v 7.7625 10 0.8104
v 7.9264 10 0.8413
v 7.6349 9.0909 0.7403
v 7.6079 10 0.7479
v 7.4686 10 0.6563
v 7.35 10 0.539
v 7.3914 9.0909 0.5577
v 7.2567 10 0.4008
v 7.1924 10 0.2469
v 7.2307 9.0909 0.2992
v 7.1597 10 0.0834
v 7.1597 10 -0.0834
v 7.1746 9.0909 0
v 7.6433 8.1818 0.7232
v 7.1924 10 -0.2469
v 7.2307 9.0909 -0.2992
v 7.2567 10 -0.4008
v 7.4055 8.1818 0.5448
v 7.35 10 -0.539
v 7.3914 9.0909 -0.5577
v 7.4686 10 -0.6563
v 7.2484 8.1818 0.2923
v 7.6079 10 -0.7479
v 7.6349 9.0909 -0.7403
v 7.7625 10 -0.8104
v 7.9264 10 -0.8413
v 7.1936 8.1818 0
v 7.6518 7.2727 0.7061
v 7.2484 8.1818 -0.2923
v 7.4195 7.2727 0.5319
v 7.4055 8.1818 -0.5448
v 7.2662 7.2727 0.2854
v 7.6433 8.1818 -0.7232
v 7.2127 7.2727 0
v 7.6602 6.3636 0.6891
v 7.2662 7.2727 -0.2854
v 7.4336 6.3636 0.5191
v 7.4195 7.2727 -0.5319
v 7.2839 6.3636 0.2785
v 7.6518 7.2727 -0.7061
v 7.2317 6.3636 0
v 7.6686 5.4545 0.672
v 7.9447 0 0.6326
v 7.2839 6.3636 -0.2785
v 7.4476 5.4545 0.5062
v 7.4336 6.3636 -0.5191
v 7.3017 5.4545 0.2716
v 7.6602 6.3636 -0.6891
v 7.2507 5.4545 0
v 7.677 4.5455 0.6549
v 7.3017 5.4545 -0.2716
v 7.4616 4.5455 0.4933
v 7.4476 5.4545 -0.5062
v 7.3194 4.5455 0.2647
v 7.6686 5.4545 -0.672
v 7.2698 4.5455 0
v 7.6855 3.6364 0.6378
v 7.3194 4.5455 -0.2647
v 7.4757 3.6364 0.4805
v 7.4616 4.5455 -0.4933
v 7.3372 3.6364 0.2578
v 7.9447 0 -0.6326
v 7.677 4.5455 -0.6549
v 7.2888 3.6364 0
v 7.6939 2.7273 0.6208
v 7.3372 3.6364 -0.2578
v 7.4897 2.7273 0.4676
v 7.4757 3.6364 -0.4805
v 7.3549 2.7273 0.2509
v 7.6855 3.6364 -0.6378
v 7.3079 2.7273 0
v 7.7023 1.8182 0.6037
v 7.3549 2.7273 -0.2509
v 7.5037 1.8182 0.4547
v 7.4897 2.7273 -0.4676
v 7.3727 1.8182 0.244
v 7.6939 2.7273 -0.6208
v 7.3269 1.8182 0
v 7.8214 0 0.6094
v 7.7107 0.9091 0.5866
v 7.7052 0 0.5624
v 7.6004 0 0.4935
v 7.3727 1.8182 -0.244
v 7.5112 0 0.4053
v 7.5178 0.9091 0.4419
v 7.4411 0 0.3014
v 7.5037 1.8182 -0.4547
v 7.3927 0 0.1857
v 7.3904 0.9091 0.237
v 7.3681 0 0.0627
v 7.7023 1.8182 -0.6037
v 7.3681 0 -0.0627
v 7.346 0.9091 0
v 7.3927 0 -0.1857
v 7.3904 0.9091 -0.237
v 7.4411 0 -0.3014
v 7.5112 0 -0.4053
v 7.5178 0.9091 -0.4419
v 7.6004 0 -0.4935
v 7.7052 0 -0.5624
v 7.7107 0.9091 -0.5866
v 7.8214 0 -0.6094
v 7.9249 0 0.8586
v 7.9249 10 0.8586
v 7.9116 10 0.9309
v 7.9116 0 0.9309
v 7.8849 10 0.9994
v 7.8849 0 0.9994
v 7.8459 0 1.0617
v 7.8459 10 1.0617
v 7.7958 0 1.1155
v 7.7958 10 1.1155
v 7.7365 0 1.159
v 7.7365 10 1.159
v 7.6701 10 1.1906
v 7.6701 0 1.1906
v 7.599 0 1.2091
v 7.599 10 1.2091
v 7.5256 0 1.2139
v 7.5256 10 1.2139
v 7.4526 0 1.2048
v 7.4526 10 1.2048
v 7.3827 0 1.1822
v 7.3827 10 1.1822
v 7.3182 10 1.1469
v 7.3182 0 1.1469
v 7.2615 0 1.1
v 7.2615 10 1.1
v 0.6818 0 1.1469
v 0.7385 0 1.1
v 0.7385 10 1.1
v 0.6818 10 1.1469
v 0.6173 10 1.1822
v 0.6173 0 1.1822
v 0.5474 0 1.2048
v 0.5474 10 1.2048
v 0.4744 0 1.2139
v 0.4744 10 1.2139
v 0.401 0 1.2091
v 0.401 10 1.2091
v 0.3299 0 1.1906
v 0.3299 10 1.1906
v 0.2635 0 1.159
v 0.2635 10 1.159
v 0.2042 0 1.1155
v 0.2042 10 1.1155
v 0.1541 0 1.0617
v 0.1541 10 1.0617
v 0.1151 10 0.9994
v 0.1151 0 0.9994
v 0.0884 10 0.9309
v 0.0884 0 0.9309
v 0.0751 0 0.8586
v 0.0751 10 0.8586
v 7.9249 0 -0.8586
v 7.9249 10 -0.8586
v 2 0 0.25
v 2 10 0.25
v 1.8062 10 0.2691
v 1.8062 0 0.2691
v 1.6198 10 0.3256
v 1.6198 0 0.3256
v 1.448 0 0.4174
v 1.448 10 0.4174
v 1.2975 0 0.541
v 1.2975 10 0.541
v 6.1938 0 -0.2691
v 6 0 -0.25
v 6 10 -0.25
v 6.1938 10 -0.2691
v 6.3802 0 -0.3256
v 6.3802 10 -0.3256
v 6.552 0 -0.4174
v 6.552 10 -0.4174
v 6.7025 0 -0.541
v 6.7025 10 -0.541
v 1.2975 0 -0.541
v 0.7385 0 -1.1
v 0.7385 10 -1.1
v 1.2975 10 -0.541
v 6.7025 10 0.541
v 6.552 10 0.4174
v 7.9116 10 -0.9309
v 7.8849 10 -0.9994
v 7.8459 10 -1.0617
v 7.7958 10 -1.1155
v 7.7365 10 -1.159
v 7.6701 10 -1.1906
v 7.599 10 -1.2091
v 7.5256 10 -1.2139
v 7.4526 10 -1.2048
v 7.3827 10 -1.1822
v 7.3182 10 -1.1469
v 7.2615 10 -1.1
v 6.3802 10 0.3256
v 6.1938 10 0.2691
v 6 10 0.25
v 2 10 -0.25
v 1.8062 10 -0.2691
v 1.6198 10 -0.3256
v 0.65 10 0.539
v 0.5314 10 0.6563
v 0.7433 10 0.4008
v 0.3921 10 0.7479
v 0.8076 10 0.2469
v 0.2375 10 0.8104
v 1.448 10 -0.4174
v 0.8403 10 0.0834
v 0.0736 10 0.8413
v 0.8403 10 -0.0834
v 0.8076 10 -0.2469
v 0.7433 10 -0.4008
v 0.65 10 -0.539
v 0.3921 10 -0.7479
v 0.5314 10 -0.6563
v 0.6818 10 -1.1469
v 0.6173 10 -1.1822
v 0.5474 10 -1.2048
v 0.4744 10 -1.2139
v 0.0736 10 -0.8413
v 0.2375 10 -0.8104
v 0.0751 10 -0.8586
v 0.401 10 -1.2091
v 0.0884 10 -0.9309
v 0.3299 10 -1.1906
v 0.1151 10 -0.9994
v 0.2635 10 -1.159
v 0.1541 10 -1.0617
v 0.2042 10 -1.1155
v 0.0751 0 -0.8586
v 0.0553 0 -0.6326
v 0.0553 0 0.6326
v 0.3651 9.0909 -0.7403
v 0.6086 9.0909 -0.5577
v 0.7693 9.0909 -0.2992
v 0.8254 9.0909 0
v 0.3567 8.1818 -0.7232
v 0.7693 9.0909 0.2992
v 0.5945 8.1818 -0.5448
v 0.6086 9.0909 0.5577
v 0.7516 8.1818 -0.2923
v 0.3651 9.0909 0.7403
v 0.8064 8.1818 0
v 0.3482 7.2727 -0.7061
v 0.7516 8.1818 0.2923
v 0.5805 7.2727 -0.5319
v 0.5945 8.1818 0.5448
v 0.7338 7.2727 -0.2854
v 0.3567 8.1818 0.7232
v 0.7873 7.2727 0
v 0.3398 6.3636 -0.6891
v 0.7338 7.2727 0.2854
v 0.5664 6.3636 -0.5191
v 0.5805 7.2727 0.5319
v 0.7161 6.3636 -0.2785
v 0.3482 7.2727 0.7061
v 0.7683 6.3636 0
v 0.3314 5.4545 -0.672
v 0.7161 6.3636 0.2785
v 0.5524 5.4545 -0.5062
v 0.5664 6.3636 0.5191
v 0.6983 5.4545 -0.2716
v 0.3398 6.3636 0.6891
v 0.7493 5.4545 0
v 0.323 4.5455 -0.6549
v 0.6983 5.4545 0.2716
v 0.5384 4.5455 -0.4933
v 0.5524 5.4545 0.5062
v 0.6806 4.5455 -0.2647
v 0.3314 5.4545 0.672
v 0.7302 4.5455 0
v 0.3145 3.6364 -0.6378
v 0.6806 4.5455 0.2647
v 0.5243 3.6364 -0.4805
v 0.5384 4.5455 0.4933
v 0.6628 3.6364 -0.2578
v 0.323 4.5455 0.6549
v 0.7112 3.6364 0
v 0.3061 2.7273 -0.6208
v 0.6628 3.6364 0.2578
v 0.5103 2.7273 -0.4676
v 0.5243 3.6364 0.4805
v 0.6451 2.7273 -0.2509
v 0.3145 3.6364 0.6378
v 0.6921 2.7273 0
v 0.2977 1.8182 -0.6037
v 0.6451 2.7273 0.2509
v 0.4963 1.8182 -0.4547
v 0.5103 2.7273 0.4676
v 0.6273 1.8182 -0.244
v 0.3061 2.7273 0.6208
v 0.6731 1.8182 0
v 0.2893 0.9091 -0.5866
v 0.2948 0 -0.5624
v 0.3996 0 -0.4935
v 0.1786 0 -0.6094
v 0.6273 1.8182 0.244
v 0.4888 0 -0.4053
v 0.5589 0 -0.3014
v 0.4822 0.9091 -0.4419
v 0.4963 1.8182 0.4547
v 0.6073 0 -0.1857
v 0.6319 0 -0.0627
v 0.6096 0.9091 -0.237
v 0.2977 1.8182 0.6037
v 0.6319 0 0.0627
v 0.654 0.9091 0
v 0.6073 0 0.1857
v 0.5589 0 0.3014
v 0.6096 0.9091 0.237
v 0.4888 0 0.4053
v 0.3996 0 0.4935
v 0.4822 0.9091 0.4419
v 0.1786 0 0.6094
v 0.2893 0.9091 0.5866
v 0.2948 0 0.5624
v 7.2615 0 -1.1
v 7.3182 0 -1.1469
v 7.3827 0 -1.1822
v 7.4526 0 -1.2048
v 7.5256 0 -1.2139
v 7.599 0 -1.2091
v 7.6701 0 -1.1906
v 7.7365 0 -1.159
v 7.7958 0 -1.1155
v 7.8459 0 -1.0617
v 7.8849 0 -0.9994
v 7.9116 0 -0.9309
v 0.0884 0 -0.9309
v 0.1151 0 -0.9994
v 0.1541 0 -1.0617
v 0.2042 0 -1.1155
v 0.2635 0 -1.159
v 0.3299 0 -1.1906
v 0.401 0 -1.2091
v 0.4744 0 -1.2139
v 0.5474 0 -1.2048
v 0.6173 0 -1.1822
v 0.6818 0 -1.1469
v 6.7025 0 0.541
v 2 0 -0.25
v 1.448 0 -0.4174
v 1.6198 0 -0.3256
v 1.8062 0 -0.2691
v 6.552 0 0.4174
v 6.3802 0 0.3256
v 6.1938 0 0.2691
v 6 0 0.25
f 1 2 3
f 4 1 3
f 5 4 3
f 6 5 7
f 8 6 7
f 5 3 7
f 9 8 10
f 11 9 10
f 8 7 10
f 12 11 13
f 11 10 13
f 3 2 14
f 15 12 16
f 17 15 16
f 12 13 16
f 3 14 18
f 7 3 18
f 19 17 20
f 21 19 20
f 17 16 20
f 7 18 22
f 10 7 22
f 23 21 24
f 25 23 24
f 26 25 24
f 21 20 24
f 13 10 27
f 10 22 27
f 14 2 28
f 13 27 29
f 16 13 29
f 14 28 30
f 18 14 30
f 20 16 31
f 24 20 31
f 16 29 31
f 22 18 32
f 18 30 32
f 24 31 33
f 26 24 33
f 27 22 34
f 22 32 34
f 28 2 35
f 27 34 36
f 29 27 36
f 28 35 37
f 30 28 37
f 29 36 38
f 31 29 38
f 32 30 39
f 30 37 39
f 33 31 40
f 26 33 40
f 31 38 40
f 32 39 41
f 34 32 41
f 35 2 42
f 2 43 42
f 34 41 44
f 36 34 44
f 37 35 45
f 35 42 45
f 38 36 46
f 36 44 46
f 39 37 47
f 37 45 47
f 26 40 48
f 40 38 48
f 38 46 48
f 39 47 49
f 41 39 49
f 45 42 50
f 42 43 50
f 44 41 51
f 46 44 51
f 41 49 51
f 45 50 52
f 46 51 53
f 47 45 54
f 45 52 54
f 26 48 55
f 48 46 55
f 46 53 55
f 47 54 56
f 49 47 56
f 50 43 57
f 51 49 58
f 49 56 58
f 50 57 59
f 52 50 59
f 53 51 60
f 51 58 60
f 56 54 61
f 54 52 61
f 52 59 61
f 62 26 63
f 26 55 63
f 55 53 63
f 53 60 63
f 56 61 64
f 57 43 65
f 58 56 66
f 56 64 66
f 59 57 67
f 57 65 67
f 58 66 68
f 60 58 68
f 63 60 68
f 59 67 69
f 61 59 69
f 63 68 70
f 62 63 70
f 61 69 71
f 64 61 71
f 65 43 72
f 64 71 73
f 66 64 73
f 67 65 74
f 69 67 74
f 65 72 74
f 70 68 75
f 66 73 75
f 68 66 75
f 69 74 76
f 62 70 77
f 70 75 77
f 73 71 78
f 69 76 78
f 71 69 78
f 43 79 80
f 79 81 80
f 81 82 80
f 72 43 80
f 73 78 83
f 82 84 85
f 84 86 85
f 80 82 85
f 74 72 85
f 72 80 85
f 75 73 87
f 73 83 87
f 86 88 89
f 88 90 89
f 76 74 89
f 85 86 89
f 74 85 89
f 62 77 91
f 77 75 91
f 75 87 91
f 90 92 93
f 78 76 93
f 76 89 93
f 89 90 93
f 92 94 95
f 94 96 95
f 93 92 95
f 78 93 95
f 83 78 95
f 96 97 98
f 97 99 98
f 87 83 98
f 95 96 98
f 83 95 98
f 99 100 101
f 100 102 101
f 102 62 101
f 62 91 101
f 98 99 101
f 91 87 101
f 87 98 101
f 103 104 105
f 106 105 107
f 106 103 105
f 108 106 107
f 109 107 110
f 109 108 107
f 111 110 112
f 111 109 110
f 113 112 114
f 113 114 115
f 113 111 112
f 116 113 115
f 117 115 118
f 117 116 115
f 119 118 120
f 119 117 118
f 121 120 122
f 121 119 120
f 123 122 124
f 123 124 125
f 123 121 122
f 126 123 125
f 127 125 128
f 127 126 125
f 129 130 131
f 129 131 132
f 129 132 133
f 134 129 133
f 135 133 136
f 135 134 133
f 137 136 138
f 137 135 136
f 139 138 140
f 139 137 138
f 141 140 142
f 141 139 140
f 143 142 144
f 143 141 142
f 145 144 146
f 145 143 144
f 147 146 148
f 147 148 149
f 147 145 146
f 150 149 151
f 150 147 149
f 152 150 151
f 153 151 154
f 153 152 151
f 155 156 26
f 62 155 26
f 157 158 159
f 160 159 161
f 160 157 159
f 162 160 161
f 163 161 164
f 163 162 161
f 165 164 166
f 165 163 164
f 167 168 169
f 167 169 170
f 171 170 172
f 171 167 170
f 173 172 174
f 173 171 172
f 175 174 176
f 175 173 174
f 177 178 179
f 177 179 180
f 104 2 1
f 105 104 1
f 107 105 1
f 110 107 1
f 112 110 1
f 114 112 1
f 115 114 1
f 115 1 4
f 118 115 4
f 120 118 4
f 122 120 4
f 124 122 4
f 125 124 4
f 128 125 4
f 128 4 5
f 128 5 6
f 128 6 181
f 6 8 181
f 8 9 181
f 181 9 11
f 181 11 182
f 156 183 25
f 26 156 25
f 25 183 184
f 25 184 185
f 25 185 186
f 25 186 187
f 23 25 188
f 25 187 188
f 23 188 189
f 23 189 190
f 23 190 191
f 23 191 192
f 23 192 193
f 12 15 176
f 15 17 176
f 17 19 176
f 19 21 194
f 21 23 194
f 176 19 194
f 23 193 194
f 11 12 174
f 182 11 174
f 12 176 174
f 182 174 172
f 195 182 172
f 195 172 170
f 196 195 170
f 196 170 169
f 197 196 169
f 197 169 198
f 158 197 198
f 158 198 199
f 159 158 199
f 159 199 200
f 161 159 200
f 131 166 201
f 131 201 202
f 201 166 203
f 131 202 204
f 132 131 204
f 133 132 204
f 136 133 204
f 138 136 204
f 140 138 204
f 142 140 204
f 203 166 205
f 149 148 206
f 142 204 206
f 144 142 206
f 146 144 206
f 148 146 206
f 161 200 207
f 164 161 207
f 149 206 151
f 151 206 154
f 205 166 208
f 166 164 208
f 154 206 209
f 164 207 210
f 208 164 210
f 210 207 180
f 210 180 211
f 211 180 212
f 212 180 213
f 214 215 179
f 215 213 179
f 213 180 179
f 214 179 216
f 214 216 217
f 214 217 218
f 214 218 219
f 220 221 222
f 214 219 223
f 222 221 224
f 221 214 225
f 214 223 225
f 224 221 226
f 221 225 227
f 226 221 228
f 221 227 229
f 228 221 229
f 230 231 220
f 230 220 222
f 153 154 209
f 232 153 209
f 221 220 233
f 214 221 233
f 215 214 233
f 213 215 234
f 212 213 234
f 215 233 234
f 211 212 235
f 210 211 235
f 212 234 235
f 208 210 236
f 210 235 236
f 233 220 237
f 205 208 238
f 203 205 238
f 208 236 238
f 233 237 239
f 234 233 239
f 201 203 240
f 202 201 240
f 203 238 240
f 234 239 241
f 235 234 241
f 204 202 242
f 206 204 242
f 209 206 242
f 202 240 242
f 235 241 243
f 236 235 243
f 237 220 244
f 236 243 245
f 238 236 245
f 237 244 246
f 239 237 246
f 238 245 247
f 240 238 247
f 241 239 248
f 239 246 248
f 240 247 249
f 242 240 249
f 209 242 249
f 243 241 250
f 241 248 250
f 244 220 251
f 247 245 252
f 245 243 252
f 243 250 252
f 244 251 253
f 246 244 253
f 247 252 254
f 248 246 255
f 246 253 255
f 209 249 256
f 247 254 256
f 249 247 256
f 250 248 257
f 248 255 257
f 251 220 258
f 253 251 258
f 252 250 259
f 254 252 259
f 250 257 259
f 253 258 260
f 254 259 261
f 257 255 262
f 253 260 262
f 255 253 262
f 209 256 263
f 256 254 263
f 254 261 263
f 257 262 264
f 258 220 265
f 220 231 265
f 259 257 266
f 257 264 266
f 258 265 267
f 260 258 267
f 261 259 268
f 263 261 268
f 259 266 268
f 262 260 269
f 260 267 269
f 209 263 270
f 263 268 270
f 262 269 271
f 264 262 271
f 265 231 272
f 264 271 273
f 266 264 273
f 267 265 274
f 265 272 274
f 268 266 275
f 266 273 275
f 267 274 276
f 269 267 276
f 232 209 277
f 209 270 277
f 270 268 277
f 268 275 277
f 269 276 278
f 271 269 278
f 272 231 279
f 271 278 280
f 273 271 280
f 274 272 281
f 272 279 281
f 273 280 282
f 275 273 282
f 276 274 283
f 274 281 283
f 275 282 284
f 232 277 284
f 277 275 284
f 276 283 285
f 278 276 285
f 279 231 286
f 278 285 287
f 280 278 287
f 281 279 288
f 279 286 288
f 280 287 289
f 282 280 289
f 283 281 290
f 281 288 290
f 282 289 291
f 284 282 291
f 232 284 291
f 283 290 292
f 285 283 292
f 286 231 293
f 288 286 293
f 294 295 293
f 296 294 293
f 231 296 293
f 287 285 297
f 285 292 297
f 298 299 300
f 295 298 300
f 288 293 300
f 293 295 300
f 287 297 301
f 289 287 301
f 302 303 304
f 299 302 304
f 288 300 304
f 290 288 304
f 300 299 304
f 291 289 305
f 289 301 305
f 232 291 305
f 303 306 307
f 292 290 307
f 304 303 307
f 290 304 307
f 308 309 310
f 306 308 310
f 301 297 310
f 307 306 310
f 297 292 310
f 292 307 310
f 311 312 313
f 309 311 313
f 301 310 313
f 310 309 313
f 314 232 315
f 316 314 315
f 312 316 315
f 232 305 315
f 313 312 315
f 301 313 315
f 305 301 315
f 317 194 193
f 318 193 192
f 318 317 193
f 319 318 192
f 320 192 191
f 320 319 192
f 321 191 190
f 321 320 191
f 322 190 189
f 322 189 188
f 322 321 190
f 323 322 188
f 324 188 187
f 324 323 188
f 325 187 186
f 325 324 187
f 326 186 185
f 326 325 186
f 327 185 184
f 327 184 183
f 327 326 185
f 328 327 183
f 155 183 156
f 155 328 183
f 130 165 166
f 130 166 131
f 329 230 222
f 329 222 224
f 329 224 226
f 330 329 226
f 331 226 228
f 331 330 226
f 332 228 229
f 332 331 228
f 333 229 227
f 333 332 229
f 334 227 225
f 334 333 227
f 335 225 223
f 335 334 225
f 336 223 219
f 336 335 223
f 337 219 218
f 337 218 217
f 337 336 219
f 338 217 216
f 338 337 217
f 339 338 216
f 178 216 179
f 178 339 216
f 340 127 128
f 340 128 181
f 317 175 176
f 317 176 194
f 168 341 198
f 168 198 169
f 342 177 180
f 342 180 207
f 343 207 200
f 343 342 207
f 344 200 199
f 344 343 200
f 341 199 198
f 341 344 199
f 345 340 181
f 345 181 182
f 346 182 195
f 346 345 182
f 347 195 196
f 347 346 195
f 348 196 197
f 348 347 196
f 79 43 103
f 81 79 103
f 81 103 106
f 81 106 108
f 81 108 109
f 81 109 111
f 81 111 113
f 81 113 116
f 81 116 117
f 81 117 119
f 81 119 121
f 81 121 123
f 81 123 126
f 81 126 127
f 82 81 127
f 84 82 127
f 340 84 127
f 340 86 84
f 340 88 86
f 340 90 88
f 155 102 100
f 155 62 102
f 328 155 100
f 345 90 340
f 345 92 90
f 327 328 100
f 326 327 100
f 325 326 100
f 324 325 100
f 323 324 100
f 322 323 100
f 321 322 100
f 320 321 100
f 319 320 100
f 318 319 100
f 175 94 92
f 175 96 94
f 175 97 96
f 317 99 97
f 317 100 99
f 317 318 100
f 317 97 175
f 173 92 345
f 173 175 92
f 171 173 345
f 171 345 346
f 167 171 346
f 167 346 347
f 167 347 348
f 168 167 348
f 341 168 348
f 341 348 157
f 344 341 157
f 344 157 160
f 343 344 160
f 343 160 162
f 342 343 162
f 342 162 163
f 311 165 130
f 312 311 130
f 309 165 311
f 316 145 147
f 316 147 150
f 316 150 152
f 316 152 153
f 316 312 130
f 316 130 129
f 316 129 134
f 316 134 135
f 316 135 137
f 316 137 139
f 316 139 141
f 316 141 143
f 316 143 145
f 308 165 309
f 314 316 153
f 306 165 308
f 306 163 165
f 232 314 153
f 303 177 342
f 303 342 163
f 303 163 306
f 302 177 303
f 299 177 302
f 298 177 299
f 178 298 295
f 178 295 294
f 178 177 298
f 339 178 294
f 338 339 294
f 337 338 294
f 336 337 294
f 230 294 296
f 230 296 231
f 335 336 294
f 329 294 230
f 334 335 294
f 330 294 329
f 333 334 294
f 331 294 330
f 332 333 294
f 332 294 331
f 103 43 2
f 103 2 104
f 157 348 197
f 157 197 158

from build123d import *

# Parameters (mm, degrees)
BOSS_EXTRUDE2_DEPTH          = 10
SKETCH5_R                    = 0.635
CUT_EXTRUDE1_DEPTH           = 10
CUT_EXTRUDE1_DRAFT           = 1.2
CUT_EXTRUDE1_PROFILE_2_DEPTH = 10
CUT_EXTRUDE1_PROFILE_2_DRAFT = 1.2


with BuildPart() as part:
    # Sketch2 → Boss-Extrude2 (new body)
    with BuildSketch(Plane(origin=(0, 0, 0), x_dir=(1, 0, 0), z_dir=(0, 1, 0))):
        with BuildLine():
            Line((0.055343897, 0.632583633), (0.075113859, 0.858555332))
            ThreePointArc((0.075113859, 0.858555332), (0.329887136, 1.190582332), (0.738477631, 1.1))
            Line((0.738477631, 1.1), (1.297487373, 0.540990258))
            ThreePointArc((1.297487373, 0.540990258), (1.619802906, 0.325625904), (2, 0.25))
            Line((2, 0.25), (6, 0.25))
            ThreePointArc((6, 0.25), (6.380197094, 0.325625904), (6.702512627, 0.540990258))
            Line((6.702512627, 0.540990258), (7.261522369, 1.1))
            ThreePointArc((7.261522369, 1.1), (7.670112864, 1.190582332), (7.924886141, 0.858555332))
            Line((7.924886141, 0.858555332), (7.944656103, 0.632583633))
            Line((7.944656103, 0.632583633), (7.944656103, -0.632583633))
            Line((7.944656103, -0.632583633), (7.924886141, -0.858555332))
            ThreePointArc((7.924886141, -0.858555332), (7.670112864, -1.190582332), (7.261522369, -1.1))
            Line((7.261522369, -1.1), (6.702512627, -0.540990258))
            ThreePointArc((6.702512627, -0.540990258), (6.380197094, -0.325625904), (6, -0.25))
            Line((6, -0.25), (2, -0.25))
            ThreePointArc((2, -0.25), (1.619802906, -0.325625904), (1.297487373, -0.540990258))
            Line((1.297487373, -0.540990258), (0.738477631, -1.1))
            ThreePointArc((0.738477631, -1.1), (0.329887136, -1.190582332), (0.075113859, -0.858555332))
            Line((0.075113859, -0.858555332), (0.055343897, -0.632583633))
            Line((0.055343897, -0.632583633), (0.055343897, 0.632583633))
        make_face()
    extrude(amount=BOSS_EXTRUDE2_DEPTH)


with BuildPart() as cut_extrude1_tool:
    # Sketch5 → Cut-Extrude1 (with draft: the straight prism first)
    with BuildSketch(Plane.XZ):
        Circle(SKETCH5_R)
    extrude(amount=-CUT_EXTRUDE1_DEPTH)
    # Cut-Extrude1: the draft: its side faces are tilted about the plane it starts from
    cut_extrude1_sides = [cut_extrude1_tool.faces().sort_by_distance(p)[0] for p in [
        (-0.635, 5, 0),
    ]]
    draft(cut_extrude1_sides, Plane.XZ, CUT_EXTRUDE1_DRAFT)


with BuildPart() as part_1:
    add(part.part)

    # Cut-Extrude1: cut by cut_extrude1_tool
    add(cut_extrude1_tool.part, mode=Mode.SUBTRACT)


with BuildPart() as cut_extrude1_profile_2_tool:
    # Sketch5 → Cut-Extrude1 profile 2 (with draft: the straight prism first)
    with BuildSketch(Plane.XZ):
        with Locations((8, 0)):
            Circle(SKETCH5_R)
    extrude(amount=-CUT_EXTRUDE1_PROFILE_2_DEPTH)
    # Cut-Extrude1 profile 2: the draft: its side faces are tilted about the plane it starts from
    cut_extrude1_profile_2_sides = [cut_extrude1_profile_2_tool.faces().sort_by_distance(p)[0] for p in [
        (7.365, 5, 0),
    ]]
    draft(cut_extrude1_profile_2_sides, Plane.XZ, CUT_EXTRUDE1_PROFILE_2_DRAFT)


with BuildPart() as part_2:
    add(part_1.part)

    # Cut-Extrude1 profile 2: cut by cut_extrude1_profile_2_tool
    add(cut_extrude1_profile_2_tool.part, mode=Mode.SUBTRACT)


solid = part_2.part
